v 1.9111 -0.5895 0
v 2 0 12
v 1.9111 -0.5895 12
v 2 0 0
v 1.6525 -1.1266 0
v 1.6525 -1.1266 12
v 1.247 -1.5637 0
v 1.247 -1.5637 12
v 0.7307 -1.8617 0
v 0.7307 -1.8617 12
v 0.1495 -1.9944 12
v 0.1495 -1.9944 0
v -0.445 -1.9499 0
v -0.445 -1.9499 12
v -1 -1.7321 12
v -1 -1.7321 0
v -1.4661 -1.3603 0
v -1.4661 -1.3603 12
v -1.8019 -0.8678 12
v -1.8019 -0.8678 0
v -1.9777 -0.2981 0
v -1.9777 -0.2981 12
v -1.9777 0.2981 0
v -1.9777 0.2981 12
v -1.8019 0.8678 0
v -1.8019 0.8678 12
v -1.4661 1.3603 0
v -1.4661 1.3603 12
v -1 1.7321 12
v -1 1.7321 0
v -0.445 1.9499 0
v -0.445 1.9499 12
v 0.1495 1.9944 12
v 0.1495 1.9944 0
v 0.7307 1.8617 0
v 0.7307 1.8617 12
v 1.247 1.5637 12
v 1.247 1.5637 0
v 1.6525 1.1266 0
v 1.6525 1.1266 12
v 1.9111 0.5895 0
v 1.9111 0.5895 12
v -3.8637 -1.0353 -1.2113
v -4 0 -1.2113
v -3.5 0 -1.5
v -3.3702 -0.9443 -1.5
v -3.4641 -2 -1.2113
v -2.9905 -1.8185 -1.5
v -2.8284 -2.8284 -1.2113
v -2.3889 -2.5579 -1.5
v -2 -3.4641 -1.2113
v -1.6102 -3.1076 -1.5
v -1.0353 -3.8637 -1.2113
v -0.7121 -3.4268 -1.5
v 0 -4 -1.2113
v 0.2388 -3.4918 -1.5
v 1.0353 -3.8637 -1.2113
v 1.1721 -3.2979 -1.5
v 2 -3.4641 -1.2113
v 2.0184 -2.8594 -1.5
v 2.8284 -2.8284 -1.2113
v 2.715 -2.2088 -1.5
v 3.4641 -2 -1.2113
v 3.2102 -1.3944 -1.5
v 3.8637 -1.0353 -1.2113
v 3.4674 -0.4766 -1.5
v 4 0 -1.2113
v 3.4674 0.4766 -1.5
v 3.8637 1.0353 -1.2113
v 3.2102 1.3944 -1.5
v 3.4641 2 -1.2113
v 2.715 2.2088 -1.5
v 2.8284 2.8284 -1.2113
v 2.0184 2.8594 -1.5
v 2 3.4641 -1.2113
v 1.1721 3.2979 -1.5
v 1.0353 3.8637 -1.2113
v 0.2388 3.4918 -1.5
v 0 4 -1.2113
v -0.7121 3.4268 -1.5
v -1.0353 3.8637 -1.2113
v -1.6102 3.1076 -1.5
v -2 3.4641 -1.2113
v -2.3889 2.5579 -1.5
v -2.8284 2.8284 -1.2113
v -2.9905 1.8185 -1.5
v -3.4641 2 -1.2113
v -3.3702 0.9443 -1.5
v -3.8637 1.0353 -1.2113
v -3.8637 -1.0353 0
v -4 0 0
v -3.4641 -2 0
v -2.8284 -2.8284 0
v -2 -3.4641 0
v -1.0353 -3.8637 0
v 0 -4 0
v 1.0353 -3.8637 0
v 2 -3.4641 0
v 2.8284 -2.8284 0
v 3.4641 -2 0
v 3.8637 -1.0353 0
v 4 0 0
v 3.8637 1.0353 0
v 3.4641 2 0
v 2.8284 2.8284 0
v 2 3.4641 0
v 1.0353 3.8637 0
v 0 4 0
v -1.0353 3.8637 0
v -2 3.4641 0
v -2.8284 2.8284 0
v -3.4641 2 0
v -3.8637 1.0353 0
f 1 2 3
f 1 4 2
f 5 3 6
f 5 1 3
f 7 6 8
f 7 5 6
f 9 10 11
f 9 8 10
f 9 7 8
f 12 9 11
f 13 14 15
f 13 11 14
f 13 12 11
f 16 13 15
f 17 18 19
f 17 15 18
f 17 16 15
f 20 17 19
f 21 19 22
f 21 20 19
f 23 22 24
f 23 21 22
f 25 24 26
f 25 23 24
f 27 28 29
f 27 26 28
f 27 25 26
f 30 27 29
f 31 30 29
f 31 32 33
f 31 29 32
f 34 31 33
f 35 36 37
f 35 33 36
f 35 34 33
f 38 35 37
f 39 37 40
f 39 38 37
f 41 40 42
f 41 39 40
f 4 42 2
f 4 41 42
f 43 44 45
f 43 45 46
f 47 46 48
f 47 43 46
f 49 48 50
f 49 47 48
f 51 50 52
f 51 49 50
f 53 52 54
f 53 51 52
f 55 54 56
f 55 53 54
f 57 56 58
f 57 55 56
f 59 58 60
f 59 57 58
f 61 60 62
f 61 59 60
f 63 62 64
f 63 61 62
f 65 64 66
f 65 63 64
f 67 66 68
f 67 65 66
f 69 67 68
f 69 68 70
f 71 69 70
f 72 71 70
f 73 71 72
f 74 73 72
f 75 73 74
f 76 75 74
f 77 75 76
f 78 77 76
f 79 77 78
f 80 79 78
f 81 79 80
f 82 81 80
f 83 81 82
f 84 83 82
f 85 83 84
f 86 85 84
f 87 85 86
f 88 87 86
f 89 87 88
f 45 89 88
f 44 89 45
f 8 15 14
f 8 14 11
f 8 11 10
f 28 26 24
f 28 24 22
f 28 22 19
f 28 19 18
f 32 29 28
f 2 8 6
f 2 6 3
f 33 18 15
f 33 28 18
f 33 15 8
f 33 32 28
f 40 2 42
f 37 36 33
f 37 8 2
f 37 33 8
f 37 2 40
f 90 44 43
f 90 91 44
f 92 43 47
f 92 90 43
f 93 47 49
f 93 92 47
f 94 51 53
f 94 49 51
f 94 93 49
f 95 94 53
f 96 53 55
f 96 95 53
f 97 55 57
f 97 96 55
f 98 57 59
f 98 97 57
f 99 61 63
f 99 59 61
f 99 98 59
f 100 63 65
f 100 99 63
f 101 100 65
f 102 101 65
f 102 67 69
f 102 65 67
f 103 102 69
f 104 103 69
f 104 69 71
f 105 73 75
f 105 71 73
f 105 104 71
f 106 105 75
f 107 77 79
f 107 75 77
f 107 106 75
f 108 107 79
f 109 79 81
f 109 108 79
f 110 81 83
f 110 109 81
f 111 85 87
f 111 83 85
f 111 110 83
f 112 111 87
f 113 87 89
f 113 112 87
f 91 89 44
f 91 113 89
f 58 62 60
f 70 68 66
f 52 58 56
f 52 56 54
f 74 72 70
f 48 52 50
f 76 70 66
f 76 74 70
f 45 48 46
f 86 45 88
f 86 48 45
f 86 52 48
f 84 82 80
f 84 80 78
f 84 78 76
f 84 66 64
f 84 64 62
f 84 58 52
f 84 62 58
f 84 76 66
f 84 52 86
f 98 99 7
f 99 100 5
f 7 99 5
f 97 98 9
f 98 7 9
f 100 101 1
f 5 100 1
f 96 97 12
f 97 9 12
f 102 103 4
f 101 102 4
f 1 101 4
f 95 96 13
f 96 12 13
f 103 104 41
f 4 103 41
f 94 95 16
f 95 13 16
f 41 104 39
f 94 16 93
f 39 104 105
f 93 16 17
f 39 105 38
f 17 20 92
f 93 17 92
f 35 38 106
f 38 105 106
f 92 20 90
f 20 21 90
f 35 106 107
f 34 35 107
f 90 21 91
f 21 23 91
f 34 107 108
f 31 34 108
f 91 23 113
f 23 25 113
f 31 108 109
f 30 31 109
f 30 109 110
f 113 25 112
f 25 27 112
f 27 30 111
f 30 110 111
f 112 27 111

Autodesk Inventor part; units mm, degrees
ref_plane "YZ Plane" through (0, 0, 0) normal (1, 0, 0) x (0, 1, 0)
ref_plane "XZ Plane" through (0, 0, 0) normal (0, 1, 0) x (-1, 0, 0)
ref_plane "XY Plane" through (0, 0, 0) normal (0, 0, 1) x (1, 0, 0)
sketch "スケッチ1" plane through (0, 0, 0) normal (0, 0, 1) x (1, 0, 0)
  circle A0 centre (0, 0) radius 2
  dimension "d0" = 4
extrude "押し出し1" add sketch "スケッチ1" along normal blind 12
sketch "スケッチ2" plane through (0, 0, 0) normal (0, 0, -1) x (-1, 0, 0)
  circle A0 centre (0, 0) radius 4
  dimension "d3" = 8
extrude "押し出し2" add sketch "スケッチ2" along normal blind 1.5
thread "ねじ1" size "M4x0.7" class "6g" standard "ANSI Metric M Profile" full length
chamfer "面取り1" distance 0.5 angle 30 1 edges at (4, 0, -1.5) measured on face at (-0.7574, 1.0973, -1.5)
properties part number "ネジローヘッドm4,12" material "鋼、高強度、低合金"
